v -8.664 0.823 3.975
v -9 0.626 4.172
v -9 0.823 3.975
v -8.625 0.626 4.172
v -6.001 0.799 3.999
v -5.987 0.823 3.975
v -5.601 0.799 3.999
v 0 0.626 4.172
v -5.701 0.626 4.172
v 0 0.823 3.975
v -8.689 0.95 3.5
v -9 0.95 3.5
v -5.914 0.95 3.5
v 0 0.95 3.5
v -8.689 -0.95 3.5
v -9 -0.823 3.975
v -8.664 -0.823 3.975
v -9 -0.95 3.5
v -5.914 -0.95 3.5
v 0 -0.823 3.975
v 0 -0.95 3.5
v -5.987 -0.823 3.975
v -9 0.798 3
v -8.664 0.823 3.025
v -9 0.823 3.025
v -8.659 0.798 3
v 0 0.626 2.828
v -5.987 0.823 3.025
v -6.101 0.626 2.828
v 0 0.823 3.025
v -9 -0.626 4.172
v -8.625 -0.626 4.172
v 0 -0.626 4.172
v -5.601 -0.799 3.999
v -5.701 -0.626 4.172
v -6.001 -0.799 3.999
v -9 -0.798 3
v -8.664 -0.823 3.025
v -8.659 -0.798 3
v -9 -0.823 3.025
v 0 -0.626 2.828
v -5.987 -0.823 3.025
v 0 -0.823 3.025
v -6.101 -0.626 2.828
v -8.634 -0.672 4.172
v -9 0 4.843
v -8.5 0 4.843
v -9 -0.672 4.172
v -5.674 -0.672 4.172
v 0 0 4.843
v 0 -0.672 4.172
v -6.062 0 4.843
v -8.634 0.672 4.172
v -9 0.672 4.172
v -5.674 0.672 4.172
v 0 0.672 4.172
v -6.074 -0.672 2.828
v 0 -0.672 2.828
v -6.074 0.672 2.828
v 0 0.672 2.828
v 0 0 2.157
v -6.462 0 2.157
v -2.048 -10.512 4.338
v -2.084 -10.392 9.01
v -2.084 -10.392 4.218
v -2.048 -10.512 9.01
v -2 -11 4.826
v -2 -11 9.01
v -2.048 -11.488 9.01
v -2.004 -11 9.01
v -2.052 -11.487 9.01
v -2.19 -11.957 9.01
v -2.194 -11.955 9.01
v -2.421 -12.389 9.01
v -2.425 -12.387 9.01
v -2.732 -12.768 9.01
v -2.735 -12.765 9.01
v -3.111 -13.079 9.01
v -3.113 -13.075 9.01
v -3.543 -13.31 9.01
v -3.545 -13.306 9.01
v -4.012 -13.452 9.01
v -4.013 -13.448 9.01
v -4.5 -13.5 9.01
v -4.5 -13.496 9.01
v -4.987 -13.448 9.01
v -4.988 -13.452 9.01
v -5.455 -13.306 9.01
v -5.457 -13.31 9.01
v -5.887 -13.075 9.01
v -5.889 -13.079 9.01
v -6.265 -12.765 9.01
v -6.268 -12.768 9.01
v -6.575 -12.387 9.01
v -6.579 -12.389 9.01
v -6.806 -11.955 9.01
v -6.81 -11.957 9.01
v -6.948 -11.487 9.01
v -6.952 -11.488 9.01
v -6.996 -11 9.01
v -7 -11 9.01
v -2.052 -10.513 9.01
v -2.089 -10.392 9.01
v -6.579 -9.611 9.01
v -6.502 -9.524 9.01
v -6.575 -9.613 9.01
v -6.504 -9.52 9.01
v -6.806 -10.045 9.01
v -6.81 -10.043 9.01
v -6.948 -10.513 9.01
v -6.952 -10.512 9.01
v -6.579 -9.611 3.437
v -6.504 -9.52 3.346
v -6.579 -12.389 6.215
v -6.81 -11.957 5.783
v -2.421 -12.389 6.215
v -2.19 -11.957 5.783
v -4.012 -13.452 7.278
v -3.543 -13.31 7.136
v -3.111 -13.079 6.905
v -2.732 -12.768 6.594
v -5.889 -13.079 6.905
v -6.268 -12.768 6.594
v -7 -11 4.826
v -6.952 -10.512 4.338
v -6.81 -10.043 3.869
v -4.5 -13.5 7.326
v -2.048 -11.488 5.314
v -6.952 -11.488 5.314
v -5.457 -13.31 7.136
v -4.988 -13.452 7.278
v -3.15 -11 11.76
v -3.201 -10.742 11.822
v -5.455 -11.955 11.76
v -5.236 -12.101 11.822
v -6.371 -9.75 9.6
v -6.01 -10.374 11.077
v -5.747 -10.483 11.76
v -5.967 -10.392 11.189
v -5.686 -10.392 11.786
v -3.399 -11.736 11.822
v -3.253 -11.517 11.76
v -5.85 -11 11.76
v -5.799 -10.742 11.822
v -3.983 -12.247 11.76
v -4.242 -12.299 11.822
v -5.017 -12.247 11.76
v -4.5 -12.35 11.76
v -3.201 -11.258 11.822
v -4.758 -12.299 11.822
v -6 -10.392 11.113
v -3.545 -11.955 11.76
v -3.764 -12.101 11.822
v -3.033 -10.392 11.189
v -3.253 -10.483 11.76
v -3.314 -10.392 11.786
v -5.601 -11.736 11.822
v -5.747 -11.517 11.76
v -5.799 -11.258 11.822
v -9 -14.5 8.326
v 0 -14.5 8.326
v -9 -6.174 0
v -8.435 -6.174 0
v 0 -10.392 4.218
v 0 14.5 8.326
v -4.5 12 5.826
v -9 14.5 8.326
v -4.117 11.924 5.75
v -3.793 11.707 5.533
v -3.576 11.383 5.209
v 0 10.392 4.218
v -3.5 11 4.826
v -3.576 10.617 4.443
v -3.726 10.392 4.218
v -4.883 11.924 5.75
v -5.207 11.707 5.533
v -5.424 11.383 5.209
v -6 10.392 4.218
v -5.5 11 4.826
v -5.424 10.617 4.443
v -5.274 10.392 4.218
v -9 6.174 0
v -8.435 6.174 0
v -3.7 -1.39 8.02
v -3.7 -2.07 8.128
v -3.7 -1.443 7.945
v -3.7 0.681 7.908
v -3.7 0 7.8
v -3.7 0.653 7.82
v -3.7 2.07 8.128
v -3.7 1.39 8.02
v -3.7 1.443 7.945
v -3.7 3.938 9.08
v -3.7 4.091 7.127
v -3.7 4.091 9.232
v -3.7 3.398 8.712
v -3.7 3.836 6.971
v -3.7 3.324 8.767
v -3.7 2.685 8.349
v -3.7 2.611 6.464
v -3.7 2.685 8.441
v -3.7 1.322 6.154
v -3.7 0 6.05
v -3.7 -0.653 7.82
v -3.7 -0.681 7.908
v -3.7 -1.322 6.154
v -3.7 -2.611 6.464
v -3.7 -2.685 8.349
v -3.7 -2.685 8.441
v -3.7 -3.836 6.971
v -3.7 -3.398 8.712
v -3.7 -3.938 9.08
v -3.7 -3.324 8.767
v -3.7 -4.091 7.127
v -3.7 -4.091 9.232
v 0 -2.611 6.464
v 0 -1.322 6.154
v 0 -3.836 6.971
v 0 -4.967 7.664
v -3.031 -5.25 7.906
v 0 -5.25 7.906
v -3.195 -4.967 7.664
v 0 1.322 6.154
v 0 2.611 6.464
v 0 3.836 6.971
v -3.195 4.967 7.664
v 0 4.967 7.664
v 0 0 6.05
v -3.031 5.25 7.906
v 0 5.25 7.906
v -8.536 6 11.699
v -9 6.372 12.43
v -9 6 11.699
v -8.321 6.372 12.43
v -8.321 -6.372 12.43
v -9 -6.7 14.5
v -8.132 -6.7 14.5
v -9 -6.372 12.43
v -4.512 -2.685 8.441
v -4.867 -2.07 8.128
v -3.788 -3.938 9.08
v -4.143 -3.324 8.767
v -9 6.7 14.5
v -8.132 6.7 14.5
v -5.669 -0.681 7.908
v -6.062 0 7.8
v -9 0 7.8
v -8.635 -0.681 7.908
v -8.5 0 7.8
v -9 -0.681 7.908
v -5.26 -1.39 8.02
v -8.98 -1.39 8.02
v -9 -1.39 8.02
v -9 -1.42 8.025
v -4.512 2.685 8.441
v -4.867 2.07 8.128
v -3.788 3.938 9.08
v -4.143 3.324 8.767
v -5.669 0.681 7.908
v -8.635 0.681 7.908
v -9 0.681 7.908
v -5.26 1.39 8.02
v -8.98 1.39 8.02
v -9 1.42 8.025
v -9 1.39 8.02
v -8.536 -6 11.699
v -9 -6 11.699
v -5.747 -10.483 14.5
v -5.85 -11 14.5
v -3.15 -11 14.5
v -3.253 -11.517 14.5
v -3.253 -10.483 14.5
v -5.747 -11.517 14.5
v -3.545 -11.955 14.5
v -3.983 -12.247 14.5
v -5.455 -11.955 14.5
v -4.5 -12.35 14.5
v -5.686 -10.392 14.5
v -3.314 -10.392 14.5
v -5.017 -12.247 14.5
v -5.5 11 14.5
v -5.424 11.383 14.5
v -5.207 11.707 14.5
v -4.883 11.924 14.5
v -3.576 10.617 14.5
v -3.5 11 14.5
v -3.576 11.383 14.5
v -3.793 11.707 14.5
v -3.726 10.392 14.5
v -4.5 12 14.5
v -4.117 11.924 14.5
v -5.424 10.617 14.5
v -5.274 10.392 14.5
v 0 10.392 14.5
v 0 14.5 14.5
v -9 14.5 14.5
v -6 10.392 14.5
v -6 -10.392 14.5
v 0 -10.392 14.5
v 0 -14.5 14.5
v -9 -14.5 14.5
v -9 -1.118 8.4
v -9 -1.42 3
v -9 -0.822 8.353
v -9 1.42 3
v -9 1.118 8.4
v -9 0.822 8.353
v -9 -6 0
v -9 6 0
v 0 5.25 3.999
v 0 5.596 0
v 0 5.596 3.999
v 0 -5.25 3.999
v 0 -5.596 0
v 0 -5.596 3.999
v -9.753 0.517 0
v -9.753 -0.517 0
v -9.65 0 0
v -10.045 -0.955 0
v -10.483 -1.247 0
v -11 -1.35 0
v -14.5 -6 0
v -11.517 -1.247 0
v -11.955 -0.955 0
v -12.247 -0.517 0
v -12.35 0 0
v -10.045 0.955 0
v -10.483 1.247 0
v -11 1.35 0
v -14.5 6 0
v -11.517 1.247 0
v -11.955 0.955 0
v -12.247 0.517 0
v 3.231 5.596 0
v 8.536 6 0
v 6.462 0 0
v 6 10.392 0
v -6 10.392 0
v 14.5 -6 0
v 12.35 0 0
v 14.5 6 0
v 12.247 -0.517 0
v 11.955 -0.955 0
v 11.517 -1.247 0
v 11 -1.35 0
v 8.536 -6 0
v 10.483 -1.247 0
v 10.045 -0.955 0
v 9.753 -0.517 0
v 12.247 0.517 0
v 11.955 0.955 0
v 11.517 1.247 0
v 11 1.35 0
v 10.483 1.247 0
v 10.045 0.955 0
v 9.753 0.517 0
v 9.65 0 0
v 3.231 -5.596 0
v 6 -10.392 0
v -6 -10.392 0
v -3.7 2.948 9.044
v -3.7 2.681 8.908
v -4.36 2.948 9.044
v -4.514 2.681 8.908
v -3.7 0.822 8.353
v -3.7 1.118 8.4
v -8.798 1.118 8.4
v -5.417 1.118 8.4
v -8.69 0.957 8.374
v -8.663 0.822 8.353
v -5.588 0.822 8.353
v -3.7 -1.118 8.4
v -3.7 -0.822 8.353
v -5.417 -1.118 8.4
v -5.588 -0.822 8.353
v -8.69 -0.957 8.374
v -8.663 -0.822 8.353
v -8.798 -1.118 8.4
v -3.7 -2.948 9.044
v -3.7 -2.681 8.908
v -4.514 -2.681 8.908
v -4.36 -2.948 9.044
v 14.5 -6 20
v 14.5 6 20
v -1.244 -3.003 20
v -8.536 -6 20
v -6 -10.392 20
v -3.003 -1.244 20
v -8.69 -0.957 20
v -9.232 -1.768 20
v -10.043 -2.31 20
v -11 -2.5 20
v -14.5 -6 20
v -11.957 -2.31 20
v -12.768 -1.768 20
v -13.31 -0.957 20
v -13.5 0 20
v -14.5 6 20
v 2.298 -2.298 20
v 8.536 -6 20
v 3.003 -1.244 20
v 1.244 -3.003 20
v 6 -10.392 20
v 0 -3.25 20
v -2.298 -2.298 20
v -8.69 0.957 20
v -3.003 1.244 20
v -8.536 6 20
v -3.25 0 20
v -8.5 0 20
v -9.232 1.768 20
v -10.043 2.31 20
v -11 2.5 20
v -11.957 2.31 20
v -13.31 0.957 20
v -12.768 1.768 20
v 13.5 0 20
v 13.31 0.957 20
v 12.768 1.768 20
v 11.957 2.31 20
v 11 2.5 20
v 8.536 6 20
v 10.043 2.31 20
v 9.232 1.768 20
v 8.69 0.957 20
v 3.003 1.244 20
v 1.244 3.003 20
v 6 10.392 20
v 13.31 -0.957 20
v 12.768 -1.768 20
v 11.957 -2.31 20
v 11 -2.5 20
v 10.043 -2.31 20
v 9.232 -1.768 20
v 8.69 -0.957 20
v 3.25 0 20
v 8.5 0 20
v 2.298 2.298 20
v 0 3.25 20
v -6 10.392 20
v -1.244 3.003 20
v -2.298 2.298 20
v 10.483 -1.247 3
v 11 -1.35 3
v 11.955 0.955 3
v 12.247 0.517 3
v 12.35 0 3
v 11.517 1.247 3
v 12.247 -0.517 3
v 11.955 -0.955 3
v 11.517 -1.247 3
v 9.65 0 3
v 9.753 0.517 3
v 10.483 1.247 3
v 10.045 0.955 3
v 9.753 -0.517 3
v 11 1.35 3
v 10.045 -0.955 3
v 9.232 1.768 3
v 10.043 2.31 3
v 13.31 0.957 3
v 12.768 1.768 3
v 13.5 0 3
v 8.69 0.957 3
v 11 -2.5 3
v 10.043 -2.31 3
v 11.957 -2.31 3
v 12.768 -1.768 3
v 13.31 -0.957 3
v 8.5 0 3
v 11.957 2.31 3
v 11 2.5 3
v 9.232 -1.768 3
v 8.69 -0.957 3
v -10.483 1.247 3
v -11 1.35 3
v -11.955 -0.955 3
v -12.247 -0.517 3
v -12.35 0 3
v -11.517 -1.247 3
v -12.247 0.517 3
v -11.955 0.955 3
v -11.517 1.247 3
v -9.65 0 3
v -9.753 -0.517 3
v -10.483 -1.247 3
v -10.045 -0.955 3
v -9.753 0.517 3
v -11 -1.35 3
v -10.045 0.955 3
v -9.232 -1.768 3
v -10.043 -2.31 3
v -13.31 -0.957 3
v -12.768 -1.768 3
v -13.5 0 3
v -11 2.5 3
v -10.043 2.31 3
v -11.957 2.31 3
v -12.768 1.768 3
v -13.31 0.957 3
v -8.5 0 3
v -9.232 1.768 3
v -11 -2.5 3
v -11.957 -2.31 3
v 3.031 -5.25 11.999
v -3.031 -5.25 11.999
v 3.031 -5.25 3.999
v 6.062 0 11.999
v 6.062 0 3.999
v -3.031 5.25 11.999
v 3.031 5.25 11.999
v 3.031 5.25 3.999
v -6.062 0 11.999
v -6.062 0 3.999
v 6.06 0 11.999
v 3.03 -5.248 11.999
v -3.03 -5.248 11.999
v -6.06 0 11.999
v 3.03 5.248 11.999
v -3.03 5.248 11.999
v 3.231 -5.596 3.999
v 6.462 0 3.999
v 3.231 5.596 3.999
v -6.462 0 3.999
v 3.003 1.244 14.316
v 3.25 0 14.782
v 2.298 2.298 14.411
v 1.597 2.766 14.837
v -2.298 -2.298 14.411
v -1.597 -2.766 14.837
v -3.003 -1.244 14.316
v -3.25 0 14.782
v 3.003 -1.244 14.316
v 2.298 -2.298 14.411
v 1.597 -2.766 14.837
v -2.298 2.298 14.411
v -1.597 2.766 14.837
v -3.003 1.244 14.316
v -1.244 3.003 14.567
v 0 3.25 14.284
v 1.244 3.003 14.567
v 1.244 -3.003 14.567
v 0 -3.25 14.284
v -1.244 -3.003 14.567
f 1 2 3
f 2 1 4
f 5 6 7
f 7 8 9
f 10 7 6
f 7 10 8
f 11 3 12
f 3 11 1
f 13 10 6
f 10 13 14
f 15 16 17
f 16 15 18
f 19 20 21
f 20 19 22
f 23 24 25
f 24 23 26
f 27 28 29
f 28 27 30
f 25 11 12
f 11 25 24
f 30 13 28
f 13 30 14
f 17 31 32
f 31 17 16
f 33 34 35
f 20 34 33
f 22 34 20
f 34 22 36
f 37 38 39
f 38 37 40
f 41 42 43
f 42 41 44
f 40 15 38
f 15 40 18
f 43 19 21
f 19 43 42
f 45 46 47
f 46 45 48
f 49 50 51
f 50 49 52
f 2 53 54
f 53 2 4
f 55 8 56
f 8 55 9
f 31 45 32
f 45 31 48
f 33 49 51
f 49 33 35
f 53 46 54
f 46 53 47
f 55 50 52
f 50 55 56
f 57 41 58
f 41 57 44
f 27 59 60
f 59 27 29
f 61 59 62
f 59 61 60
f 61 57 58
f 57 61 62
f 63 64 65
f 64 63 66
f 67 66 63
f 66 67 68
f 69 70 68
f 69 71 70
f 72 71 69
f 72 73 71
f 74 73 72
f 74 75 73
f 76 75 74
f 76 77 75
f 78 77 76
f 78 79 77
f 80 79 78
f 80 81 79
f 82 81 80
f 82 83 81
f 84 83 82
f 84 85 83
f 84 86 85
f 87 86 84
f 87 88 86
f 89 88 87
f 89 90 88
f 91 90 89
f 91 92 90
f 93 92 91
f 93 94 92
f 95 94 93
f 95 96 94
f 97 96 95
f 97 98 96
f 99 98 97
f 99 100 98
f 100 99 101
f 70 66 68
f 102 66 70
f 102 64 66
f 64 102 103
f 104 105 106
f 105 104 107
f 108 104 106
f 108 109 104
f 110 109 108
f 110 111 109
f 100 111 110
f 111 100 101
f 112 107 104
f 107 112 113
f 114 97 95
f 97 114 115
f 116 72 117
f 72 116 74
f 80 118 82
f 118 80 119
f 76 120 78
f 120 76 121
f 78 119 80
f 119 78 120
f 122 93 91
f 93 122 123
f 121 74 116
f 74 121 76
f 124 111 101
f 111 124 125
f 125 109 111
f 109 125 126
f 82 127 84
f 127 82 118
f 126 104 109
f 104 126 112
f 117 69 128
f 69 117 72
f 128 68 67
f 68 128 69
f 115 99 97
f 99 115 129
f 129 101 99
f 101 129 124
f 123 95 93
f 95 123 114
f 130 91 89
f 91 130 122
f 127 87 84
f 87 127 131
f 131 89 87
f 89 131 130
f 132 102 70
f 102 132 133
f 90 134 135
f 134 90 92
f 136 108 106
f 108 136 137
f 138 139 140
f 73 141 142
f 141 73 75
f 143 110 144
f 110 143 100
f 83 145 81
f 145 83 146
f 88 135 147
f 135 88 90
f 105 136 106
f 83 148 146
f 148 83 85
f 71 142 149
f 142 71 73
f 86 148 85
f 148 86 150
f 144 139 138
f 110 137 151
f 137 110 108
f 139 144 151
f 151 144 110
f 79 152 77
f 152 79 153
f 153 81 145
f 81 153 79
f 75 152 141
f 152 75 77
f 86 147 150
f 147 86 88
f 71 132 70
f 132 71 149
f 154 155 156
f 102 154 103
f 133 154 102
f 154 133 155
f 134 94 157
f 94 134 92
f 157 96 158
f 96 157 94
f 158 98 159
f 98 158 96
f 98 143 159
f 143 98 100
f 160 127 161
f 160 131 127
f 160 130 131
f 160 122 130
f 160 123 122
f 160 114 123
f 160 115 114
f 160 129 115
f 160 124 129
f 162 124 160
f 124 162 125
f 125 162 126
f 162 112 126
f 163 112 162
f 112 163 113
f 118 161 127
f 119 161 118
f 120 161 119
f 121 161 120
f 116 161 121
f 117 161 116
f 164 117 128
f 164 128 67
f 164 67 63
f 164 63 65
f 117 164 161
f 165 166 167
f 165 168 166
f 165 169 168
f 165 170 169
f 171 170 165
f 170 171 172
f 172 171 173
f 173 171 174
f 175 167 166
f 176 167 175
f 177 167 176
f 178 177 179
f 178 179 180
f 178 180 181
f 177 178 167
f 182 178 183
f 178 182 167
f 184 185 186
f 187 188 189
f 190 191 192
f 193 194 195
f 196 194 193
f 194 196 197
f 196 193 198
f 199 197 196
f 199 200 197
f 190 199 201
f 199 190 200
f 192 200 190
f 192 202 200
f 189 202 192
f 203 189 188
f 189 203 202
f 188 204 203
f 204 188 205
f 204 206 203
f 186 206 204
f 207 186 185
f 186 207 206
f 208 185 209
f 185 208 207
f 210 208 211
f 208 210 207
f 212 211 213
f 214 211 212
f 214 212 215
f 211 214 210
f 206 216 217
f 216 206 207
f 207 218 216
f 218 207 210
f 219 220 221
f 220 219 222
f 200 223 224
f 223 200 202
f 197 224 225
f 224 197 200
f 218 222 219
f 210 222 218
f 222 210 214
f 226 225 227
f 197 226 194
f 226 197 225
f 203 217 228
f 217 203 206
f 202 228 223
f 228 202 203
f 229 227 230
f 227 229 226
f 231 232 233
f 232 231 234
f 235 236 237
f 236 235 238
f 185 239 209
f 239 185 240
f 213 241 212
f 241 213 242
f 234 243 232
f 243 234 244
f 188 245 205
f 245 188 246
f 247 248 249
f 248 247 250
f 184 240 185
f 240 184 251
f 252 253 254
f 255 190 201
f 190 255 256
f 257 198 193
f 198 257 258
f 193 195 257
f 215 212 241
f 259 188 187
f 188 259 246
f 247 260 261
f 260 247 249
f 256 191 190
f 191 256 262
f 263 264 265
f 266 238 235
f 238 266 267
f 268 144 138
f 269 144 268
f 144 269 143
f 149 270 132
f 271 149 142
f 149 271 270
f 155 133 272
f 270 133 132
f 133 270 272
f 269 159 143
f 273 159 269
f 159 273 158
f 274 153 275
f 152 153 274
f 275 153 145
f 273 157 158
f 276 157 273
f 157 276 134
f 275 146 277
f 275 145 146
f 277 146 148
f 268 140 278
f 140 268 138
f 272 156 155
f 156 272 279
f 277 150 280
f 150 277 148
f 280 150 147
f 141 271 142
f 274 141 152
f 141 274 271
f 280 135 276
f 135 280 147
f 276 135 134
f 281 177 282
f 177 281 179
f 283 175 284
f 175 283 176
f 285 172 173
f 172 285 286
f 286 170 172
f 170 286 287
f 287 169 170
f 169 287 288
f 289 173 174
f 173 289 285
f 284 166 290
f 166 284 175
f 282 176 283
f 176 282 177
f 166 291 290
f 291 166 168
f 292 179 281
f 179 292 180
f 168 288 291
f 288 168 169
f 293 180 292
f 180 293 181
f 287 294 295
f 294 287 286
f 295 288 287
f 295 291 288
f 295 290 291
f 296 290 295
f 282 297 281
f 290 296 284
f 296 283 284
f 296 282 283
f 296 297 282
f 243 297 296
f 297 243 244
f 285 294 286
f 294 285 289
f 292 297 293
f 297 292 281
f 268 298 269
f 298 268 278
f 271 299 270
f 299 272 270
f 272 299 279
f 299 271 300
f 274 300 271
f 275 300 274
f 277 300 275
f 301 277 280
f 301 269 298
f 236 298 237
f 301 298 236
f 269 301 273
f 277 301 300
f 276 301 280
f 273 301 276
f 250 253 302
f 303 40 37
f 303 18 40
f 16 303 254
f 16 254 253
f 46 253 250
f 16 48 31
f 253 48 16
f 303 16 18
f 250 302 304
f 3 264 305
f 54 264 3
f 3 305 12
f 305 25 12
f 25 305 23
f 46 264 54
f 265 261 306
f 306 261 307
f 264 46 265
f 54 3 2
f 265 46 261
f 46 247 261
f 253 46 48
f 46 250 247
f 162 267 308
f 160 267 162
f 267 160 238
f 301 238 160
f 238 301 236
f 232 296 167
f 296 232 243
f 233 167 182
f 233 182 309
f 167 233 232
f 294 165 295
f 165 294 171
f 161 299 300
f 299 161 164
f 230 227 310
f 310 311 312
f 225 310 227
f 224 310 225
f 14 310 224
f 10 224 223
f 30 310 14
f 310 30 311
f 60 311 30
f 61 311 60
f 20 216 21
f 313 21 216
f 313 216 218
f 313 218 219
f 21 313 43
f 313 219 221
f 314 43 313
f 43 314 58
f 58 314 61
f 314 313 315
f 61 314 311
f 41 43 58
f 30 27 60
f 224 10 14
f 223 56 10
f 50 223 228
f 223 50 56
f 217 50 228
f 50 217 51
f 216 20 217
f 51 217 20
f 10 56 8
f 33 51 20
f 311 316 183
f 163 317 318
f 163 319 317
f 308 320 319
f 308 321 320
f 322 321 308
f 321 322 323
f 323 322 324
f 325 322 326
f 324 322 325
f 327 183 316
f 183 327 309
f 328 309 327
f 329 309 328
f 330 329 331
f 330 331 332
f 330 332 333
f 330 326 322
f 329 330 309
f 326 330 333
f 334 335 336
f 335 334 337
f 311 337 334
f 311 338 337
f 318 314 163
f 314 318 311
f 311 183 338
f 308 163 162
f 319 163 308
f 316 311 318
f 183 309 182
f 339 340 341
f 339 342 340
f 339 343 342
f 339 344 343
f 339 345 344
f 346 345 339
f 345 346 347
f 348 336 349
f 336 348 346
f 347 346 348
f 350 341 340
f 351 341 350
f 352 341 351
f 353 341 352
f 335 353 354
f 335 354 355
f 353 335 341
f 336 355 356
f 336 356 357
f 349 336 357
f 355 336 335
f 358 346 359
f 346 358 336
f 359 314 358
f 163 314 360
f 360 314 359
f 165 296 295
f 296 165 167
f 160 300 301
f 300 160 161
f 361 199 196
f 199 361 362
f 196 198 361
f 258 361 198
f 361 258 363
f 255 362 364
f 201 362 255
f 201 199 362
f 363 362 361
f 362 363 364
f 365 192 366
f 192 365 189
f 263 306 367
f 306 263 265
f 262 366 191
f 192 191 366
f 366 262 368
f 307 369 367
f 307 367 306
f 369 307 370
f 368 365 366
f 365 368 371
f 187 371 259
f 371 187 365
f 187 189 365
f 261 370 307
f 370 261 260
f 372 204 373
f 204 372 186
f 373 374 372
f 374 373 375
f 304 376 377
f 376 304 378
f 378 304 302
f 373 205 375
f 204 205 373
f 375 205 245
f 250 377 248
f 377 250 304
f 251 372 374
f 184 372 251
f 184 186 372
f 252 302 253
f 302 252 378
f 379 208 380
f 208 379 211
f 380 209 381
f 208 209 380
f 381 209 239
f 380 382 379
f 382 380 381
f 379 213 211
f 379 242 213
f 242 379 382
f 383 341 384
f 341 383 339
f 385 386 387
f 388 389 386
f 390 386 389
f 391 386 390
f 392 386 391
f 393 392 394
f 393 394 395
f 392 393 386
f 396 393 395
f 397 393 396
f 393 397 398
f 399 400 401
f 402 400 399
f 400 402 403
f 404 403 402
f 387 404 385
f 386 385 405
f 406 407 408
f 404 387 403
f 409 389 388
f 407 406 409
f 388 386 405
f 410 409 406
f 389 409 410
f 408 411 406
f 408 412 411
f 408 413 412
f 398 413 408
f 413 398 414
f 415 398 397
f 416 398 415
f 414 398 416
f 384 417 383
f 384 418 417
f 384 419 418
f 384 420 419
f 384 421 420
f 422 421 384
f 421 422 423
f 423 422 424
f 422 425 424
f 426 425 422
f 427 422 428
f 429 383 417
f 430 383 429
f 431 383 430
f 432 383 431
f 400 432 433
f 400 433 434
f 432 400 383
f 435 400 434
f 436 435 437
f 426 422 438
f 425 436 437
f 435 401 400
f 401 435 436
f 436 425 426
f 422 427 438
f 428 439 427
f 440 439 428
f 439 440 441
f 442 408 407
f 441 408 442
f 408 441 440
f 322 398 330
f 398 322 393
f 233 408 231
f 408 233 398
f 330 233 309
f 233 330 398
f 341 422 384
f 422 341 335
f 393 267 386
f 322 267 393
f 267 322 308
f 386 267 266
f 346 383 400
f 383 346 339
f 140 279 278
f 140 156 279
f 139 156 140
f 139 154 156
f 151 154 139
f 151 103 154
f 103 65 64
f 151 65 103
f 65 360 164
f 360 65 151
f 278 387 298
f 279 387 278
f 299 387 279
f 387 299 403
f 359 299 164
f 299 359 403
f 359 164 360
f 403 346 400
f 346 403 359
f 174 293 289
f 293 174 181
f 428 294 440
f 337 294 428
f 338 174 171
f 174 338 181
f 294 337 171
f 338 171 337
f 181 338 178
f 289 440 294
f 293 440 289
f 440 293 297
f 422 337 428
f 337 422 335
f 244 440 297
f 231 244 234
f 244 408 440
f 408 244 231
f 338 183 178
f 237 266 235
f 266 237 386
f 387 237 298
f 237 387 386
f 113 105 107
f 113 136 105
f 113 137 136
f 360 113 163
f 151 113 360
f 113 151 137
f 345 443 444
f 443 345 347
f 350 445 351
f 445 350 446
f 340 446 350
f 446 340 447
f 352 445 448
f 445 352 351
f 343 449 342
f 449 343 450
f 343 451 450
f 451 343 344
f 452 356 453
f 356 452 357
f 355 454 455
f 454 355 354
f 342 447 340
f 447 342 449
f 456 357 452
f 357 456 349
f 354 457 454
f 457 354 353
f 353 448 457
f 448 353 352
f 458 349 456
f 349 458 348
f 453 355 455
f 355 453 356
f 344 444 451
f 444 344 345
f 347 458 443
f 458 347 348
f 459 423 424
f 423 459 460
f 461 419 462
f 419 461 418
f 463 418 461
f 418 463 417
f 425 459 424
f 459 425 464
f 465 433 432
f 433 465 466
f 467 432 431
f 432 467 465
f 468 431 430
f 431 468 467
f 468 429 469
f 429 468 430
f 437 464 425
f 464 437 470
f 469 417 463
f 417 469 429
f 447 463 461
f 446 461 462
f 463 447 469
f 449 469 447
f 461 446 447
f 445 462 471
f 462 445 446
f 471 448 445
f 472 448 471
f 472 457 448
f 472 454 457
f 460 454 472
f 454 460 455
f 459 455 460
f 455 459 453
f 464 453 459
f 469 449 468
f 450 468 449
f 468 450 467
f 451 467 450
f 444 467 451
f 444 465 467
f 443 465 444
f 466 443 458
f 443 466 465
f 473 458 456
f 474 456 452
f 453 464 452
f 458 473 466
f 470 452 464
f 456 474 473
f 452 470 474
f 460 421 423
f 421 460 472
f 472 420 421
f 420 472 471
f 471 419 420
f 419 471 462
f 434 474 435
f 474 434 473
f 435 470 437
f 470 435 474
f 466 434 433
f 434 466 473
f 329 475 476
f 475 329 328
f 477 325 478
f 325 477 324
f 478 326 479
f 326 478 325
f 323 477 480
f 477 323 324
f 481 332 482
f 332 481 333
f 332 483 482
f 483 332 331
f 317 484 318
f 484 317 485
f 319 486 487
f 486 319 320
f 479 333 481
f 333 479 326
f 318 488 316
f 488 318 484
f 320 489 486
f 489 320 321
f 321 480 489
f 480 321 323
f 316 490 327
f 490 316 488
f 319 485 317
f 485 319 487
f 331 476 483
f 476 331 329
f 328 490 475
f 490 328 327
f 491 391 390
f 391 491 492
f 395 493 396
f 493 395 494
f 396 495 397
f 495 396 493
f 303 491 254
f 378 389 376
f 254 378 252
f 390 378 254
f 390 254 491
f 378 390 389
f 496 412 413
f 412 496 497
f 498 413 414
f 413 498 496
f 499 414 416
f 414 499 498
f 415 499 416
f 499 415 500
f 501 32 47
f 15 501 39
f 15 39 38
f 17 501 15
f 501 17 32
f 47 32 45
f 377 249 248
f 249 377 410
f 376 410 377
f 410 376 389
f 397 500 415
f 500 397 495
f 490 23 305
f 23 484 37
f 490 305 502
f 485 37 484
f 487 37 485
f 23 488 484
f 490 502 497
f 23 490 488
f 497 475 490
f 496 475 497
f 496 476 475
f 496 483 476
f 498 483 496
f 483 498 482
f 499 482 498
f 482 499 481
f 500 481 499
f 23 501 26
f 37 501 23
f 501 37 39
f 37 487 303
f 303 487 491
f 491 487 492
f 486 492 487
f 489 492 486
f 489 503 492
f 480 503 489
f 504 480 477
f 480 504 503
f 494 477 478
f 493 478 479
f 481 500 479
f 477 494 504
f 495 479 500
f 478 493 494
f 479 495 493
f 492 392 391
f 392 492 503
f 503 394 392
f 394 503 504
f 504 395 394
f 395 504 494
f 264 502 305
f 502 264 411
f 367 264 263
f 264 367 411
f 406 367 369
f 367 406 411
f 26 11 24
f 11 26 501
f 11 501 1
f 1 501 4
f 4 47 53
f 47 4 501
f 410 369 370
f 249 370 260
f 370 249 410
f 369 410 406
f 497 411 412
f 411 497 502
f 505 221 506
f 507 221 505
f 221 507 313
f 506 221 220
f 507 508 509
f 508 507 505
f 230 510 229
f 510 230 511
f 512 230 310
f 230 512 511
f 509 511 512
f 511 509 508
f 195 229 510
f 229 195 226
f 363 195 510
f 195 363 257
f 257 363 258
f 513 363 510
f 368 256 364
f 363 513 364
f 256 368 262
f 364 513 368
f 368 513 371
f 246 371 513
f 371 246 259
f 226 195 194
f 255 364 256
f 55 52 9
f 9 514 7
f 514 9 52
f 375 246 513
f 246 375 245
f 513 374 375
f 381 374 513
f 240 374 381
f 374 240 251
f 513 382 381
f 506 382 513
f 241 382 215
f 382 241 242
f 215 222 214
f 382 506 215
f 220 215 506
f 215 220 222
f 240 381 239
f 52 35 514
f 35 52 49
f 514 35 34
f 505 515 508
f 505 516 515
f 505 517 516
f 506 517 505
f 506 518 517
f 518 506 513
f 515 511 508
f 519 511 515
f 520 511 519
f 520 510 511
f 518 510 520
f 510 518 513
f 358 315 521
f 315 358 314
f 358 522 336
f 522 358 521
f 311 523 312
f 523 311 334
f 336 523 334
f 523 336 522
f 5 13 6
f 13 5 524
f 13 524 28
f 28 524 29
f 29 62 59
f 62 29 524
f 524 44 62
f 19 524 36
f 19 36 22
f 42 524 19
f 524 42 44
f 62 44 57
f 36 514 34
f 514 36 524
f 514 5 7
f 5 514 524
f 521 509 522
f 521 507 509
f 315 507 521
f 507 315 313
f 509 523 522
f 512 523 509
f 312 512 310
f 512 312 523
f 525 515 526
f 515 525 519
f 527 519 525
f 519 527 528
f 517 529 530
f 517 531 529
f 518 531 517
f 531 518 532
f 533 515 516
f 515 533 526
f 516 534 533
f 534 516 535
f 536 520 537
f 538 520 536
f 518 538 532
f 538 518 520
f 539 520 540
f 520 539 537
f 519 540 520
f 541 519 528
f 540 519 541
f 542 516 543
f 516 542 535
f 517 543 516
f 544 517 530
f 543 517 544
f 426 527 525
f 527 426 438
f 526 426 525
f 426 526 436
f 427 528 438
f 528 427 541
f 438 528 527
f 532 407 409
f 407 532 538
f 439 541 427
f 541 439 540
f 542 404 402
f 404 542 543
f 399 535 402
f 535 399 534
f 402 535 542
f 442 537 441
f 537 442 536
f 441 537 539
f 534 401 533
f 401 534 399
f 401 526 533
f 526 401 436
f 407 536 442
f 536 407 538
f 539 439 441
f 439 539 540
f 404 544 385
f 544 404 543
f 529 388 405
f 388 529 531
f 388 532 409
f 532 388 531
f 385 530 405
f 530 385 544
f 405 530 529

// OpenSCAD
// file: nut_cutter.scad
module nut_cutter(w=5.65,depth=6,ins_delta=0.4,ins_depth=2,trans_depth=3)
{
    d=0; // z position
    chep_nut_d=w * (2/sqrt(3)); // nut tight hex
    chep_nut_depth=depth; // total depth
    chep_nut_ins_d=chep_nut_d+ins_delta; // enlarged insertion hex
    chep_nut_ins_depth=ins_depth; // insertion depth
    chep_nut_transition_depth=trans_depth; // easier 3D print, conical transition

    // duboki tijesni utor za maticu
    translate([0,0,-d/2+chep_nut_depth/2-0.001])
      cylinder(d=chep_nut_d,h=chep_nut_depth,$fn=6,center=true);
    // plitki labavi utor za maticu
    translate([0,0,-d/2+chep_nut_ins_depth/2-0.001])
      cylinder(d=chep_nut_ins_d,h=chep_nut_ins_depth,$fn=6,center=true);
    // konusni prijelaz za lakše printanje
    if(1)
    translate([0,0,-d/2+chep_nut_depth+chep_nut_transition_depth/2-0.001])
      cylinder(d1=chep_nut_d,d2=0,h=chep_nut_transition_depth+0.005,$fn=6,center=true);
}

module head_cutter(d=6,h=5)
{
  delta=0.01;
  translate([0,0,-delta])
  cylinder(d=d,h=h+2*delta,$fn=32);
  translate([0,0,h])
    cylinder(d1=d,d2=0,h*2/3,$fn=32);
    
}

//nut_cutter();
//head_cutter();
// file: rod_holder.scad
include <nut_cutter.scad>

module rod_holder()
{
    drod=6.5; // rod hole dia
    xhole=22; // mount screw holes distance
    dhole=2.7; // mount screw hole dia
    dhead=5; // mount screw head dia
    hmount=3; // mount screw height from bottom
    box=[29,12,20]; // cube dimension
    hex_d=24; // hexagon reinforcement
    translate([0,0,box[2]/2])
    difference()
    {
      union()
      {
        cube(box,center=true);
        cylinder(d=hex_d,h=box[2],$fn=6,center=true);
      }
      // cut mounting screws
      for(i=[0:1])
        rotate([0,0,180*i])
          translate([xhole/2,0,0])
          {
            // screw bolt pass
            cylinder(d=dhole,h=box[2]+0.01,$fn=16,center=true);
            // screw head inlet
            translate([0,0,-box[2]/2+hmount])
              cylinder(d=dhead,h=box[2],$fn=16);
          }
      // cut rod
      cylinder(d=drod,h=box[2]+0.01,$fn=16,center=true);
      // cut nut holder
      translate([0,0,-box[2]/2])

      nut_cutter(w=10.5,depth=12,ins_delta=0.8,ins_depth=4,trans_depth=6);
    }
}

if(0)
  rod_holder();
// file: sprocket_adapter_0.8mm_nozzle.scad
/* all measures in mm */
// 0.8mm nozzle 0.3mm layer
include <nut_cutter.scad>

/* todo:
** [x] dent holes must be aligned, not dents
** [x] narrower and smaller big dents
** [x] intercusp strain release smaller, 0.1mm
** [x] remove intercuspidation
** [x] M3 thread: -0.15
** [x] M4 thread: -0.20, waterdrop
** [x] 30 mm mount holes M4
** [x] thread for M4
** [x] cut-snap 2 piece
** [x] subtract cube, leave only lower cut-snap
** [x] 2 screws M3 to tighten cut-snap
** [x] thread for M3
** [x] remove some dents - cannot assemble!!
*/

/* Z-extrusion height (vertical) enough to hold M3 screw hole */
zdim = 9;
/* X-length */
xdim = 29;
/* Y-width */
ydim = 29;

/* free space between parts */
freespace_big = 0.2;
freespace_small = 0.4;

/* number of small dents */
ndent1 = 40;
/* dent depth */
ddent1 = 0.0; // 0.5 default, 0 to disable
/* dent width large */
wdent1l = 0.8;
/* dent width small */
wdent1s = 0.3; 
/* big wheel radius (with dents d = 16.7mm)  */
rbig = (16.7+freespace_big)/2;
/* big wheel height */
zbig = 3.7;

/* number of big dents = half of small dents */
ndent2 = ndent1/2;
/* dent depth */
ddent2 = 0.5; // 0.5 default, 0.0 to disable
/* dent width large */
wdent2l = 0.8;
/* dent width small */
wdent2s = 0.3;
/* small wheel radius (with dents d = 13.0mm) */
rsmall = (13.0+freespace_small)/2;

/* make sure we cut it all */
overcut = 0.001;

/* mounting hole radius */
rmounthole = 1.9/2;
/* mounting holes distance */
dmounthole = 22;

/* tightening screws distance (B careful, do not intersect dents) */
dtighthole = 22;
/* let screw pass freely */
rM3free = (3+1)/2;
/* screw threadhole */
rM3thread = (3-0.0)/2;

/* intercuspidation Y center aligns with tightening hole */
ycuspcenter = dtighthole/2;
/* intercuspidation depth */
dcusp = 4;
/* intercuspidation small, big */
icusps = 4;
icuspb = 5;
freecusp = 0.1;

module droplet_profile(h, r, rotation) {
        union()
        {
          cylinder(h = h, r = r, $fa=360/16, $fs=0.5, center=true);
            rotate([0,0,rotation])
              linear_extrude(height = h, twist = 0, convexity = 2, center=true)
                polygon([
                 [ -r * sqrt(2)/2, r * sqrt(2)/2],
                 [              0, r * sqrt(2)],
                 [  r * sqrt(2)/2, r * sqrt(2)/2],
                 ]);
        }

}

module eye_profile(h, r, rotation) {
        union()
        {
          cylinder(h = h, r = r, $fa=360/16, $fs=0.5, center=true);
          rotate([0,0,rotation])
              linear_extrude(height = h, twist = 0, convexity = 2, center=true)
                polygon([
                 [ -r * sqrt(2)/2, r * sqrt(2)/2],
                 [              0, r * sqrt(2)],
                 [  r * sqrt(2)/2, r * sqrt(2)/2],
                 ]);
          rotate([0,0,180+rotation])
              linear_extrude(height = h, twist = 0, convexity = 2, center=true)
                polygon([
                 [ -r * sqrt(2)/2, r * sqrt(2)/2],
                 [              0, r * sqrt(2)],
                 [  r * sqrt(2)/2, r * sqrt(2)/2],
                 ]);
        }
}

module sprocket_adapter() {
delta=0.001;
union() {
  difference() {
    translate([0,0,zdim/2])
      cube([xdim, ydim, zdim], center=true);
    union() {
      translate([0,0,zbig/2])
          cylinder(h=zbig+delta, r=rbig, $fa=360/ndent1, $fs=0.5, center=true);
      translate([0,0,zdim/2])
          cylinder(h=zdim+delta, r=rsmall, $fa=360/ndent2, $fs=0.5, center=true);

      /* 2 holes for screws cca 30 mm apart */
      translate([-dmounthole/2,0,zdim/2])
        eye_profile(h = zdim + overcut, r = rmounthole, rotation = -90);
      translate([ dmounthole/2,0,zdim/2])
        eye_profile(h = zdim + overcut, r = rmounthole, rotation = 90);

      /* tightening M3 screw, larger in "removed" part */
      translate([0,-dtighthole/2,zdim/2])
        rotate([0,90,0])
          cylinder(d=2.7,h=xdim+overcut,$fn=16,center=true); // circular
          //eye_profile(h = xdim+overcut, r = rM3free, rotation = -90); // droplet shape

    translate([-xdim/2,-dtighthole/2,zdim/2])
      rotate([0,90,0])
         head_cutter(d=5,h=9);

      /* tightening M3 screw, with droplet shape, smaller/thread in "extended" part */
    translate([0,dtighthole/2,zdim/2])
      rotate([0,90,0])
        cylinder(d=2.0,h=xdim+overcut,$fn=16,center=true); // circular
          //eye_profile(h = xdim+overcut, r = rM3thread, rotation = -90); // droplet shape

      /* polygon cuts this in snap-on half */
      translate([0,0,-delta/2])
      linear_extrude(height = zdim+delta, twist = 0, convexity = 8)
        polygon([[ 0,               -ydim/2],
                 [ xdim,            -ydim/2],
                 [ xdim,             ydim/2],
                 [ 0,                ydim/2],
                 [ 0,                ycuspcenter+icusps/2],

/* intercuspidation removed */
/*
                 [ dcusp,            ycuspcenter+icuspb/2],
                 [ dcusp,            ycuspcenter-icuspb/2],
                 [ 0,                ycuspcenter-icusps/2],
                 [ 0,               -ycuspcenter+icusps/2+freecusp],
                 [-dcusp-freecusp,  -ycuspcenter+icuspb/2+freecusp],
                 [-dcusp-freecusp,  -ycuspcenter-icuspb/2-freecusp],
                 [ 0,               -ycuspcenter-icusps/2-freecusp]
*/
                 ]*(1+delta));

      /* cuts off upper notch for easier insertion */
      translate([dcusp/2,0,zbig/2])
        cube([dcusp,ydim,zbig], center = true);

      /* cut off corners */
      for(i=[-1:2:1])
      translate([-xdim/2,ydim*i*0.92,zdim/2])
        rotate([0,0,45])
          cube([xdim,ydim,zdim+delta],center=true);
    }
  }

      /* big radius, small dents */
      for(angle = [360/ndent1/2 : 360/ndent1 : 360])
        if(angle > 180-50 && angle < 180+50)
        rotate([0,0,angle])
          translate([rbig-ddent1/2,0,0])
          {
            linear_extrude(height = zbig, twist = 0, convexity = 2)
              polygon([[ ddent1/2,        -wdent1l/2],
                       [-ddent1/2,        -wdent1s/2],
                       [-ddent1/2,         wdent1s/2],
                       [ ddent1/2,         wdent1l/2]]);
          }

      /* small radius, big dents */
      for(angle = [360/ndent2/2 : 360/ndent2 : 360])
        if(angle > 180-30 && angle < 180+30)
        rotate([0,0,angle])
          translate([rsmall-ddent2/2,0,zbig])
          {
            linear_extrude(height = zdim-zbig, twist = 0, convexity = 2)
              polygon([[ ddent2/2,        -wdent2l/2],
                       [-ddent2/2,        -wdent2s/2],
                       [-ddent2/2,         wdent2s/2],
                       [ ddent2/2,         wdent2l/2]]);
          }
}

}

// printable position
if(1)
translate([0,0,xdim/2])
  rotate([0,-90,0])
    sprocket_adapter();
// main file
// LANG=hr_HR.UTF8 prusa-slicer
// 0,8 mm nozzle
// 0.6 mm layer


include <sprocket_adapter_0.8mm_nozzle.scad>
include <rod_holder.scad>

// screws inox tin
// 2x 2.2x6 mm
// 2x 2.2x9 mm
if(0)
  rotate([0,-90,0])
    sprocket_adapter();

if(1)
  rotate([0,0,0])
  rod_holder();
